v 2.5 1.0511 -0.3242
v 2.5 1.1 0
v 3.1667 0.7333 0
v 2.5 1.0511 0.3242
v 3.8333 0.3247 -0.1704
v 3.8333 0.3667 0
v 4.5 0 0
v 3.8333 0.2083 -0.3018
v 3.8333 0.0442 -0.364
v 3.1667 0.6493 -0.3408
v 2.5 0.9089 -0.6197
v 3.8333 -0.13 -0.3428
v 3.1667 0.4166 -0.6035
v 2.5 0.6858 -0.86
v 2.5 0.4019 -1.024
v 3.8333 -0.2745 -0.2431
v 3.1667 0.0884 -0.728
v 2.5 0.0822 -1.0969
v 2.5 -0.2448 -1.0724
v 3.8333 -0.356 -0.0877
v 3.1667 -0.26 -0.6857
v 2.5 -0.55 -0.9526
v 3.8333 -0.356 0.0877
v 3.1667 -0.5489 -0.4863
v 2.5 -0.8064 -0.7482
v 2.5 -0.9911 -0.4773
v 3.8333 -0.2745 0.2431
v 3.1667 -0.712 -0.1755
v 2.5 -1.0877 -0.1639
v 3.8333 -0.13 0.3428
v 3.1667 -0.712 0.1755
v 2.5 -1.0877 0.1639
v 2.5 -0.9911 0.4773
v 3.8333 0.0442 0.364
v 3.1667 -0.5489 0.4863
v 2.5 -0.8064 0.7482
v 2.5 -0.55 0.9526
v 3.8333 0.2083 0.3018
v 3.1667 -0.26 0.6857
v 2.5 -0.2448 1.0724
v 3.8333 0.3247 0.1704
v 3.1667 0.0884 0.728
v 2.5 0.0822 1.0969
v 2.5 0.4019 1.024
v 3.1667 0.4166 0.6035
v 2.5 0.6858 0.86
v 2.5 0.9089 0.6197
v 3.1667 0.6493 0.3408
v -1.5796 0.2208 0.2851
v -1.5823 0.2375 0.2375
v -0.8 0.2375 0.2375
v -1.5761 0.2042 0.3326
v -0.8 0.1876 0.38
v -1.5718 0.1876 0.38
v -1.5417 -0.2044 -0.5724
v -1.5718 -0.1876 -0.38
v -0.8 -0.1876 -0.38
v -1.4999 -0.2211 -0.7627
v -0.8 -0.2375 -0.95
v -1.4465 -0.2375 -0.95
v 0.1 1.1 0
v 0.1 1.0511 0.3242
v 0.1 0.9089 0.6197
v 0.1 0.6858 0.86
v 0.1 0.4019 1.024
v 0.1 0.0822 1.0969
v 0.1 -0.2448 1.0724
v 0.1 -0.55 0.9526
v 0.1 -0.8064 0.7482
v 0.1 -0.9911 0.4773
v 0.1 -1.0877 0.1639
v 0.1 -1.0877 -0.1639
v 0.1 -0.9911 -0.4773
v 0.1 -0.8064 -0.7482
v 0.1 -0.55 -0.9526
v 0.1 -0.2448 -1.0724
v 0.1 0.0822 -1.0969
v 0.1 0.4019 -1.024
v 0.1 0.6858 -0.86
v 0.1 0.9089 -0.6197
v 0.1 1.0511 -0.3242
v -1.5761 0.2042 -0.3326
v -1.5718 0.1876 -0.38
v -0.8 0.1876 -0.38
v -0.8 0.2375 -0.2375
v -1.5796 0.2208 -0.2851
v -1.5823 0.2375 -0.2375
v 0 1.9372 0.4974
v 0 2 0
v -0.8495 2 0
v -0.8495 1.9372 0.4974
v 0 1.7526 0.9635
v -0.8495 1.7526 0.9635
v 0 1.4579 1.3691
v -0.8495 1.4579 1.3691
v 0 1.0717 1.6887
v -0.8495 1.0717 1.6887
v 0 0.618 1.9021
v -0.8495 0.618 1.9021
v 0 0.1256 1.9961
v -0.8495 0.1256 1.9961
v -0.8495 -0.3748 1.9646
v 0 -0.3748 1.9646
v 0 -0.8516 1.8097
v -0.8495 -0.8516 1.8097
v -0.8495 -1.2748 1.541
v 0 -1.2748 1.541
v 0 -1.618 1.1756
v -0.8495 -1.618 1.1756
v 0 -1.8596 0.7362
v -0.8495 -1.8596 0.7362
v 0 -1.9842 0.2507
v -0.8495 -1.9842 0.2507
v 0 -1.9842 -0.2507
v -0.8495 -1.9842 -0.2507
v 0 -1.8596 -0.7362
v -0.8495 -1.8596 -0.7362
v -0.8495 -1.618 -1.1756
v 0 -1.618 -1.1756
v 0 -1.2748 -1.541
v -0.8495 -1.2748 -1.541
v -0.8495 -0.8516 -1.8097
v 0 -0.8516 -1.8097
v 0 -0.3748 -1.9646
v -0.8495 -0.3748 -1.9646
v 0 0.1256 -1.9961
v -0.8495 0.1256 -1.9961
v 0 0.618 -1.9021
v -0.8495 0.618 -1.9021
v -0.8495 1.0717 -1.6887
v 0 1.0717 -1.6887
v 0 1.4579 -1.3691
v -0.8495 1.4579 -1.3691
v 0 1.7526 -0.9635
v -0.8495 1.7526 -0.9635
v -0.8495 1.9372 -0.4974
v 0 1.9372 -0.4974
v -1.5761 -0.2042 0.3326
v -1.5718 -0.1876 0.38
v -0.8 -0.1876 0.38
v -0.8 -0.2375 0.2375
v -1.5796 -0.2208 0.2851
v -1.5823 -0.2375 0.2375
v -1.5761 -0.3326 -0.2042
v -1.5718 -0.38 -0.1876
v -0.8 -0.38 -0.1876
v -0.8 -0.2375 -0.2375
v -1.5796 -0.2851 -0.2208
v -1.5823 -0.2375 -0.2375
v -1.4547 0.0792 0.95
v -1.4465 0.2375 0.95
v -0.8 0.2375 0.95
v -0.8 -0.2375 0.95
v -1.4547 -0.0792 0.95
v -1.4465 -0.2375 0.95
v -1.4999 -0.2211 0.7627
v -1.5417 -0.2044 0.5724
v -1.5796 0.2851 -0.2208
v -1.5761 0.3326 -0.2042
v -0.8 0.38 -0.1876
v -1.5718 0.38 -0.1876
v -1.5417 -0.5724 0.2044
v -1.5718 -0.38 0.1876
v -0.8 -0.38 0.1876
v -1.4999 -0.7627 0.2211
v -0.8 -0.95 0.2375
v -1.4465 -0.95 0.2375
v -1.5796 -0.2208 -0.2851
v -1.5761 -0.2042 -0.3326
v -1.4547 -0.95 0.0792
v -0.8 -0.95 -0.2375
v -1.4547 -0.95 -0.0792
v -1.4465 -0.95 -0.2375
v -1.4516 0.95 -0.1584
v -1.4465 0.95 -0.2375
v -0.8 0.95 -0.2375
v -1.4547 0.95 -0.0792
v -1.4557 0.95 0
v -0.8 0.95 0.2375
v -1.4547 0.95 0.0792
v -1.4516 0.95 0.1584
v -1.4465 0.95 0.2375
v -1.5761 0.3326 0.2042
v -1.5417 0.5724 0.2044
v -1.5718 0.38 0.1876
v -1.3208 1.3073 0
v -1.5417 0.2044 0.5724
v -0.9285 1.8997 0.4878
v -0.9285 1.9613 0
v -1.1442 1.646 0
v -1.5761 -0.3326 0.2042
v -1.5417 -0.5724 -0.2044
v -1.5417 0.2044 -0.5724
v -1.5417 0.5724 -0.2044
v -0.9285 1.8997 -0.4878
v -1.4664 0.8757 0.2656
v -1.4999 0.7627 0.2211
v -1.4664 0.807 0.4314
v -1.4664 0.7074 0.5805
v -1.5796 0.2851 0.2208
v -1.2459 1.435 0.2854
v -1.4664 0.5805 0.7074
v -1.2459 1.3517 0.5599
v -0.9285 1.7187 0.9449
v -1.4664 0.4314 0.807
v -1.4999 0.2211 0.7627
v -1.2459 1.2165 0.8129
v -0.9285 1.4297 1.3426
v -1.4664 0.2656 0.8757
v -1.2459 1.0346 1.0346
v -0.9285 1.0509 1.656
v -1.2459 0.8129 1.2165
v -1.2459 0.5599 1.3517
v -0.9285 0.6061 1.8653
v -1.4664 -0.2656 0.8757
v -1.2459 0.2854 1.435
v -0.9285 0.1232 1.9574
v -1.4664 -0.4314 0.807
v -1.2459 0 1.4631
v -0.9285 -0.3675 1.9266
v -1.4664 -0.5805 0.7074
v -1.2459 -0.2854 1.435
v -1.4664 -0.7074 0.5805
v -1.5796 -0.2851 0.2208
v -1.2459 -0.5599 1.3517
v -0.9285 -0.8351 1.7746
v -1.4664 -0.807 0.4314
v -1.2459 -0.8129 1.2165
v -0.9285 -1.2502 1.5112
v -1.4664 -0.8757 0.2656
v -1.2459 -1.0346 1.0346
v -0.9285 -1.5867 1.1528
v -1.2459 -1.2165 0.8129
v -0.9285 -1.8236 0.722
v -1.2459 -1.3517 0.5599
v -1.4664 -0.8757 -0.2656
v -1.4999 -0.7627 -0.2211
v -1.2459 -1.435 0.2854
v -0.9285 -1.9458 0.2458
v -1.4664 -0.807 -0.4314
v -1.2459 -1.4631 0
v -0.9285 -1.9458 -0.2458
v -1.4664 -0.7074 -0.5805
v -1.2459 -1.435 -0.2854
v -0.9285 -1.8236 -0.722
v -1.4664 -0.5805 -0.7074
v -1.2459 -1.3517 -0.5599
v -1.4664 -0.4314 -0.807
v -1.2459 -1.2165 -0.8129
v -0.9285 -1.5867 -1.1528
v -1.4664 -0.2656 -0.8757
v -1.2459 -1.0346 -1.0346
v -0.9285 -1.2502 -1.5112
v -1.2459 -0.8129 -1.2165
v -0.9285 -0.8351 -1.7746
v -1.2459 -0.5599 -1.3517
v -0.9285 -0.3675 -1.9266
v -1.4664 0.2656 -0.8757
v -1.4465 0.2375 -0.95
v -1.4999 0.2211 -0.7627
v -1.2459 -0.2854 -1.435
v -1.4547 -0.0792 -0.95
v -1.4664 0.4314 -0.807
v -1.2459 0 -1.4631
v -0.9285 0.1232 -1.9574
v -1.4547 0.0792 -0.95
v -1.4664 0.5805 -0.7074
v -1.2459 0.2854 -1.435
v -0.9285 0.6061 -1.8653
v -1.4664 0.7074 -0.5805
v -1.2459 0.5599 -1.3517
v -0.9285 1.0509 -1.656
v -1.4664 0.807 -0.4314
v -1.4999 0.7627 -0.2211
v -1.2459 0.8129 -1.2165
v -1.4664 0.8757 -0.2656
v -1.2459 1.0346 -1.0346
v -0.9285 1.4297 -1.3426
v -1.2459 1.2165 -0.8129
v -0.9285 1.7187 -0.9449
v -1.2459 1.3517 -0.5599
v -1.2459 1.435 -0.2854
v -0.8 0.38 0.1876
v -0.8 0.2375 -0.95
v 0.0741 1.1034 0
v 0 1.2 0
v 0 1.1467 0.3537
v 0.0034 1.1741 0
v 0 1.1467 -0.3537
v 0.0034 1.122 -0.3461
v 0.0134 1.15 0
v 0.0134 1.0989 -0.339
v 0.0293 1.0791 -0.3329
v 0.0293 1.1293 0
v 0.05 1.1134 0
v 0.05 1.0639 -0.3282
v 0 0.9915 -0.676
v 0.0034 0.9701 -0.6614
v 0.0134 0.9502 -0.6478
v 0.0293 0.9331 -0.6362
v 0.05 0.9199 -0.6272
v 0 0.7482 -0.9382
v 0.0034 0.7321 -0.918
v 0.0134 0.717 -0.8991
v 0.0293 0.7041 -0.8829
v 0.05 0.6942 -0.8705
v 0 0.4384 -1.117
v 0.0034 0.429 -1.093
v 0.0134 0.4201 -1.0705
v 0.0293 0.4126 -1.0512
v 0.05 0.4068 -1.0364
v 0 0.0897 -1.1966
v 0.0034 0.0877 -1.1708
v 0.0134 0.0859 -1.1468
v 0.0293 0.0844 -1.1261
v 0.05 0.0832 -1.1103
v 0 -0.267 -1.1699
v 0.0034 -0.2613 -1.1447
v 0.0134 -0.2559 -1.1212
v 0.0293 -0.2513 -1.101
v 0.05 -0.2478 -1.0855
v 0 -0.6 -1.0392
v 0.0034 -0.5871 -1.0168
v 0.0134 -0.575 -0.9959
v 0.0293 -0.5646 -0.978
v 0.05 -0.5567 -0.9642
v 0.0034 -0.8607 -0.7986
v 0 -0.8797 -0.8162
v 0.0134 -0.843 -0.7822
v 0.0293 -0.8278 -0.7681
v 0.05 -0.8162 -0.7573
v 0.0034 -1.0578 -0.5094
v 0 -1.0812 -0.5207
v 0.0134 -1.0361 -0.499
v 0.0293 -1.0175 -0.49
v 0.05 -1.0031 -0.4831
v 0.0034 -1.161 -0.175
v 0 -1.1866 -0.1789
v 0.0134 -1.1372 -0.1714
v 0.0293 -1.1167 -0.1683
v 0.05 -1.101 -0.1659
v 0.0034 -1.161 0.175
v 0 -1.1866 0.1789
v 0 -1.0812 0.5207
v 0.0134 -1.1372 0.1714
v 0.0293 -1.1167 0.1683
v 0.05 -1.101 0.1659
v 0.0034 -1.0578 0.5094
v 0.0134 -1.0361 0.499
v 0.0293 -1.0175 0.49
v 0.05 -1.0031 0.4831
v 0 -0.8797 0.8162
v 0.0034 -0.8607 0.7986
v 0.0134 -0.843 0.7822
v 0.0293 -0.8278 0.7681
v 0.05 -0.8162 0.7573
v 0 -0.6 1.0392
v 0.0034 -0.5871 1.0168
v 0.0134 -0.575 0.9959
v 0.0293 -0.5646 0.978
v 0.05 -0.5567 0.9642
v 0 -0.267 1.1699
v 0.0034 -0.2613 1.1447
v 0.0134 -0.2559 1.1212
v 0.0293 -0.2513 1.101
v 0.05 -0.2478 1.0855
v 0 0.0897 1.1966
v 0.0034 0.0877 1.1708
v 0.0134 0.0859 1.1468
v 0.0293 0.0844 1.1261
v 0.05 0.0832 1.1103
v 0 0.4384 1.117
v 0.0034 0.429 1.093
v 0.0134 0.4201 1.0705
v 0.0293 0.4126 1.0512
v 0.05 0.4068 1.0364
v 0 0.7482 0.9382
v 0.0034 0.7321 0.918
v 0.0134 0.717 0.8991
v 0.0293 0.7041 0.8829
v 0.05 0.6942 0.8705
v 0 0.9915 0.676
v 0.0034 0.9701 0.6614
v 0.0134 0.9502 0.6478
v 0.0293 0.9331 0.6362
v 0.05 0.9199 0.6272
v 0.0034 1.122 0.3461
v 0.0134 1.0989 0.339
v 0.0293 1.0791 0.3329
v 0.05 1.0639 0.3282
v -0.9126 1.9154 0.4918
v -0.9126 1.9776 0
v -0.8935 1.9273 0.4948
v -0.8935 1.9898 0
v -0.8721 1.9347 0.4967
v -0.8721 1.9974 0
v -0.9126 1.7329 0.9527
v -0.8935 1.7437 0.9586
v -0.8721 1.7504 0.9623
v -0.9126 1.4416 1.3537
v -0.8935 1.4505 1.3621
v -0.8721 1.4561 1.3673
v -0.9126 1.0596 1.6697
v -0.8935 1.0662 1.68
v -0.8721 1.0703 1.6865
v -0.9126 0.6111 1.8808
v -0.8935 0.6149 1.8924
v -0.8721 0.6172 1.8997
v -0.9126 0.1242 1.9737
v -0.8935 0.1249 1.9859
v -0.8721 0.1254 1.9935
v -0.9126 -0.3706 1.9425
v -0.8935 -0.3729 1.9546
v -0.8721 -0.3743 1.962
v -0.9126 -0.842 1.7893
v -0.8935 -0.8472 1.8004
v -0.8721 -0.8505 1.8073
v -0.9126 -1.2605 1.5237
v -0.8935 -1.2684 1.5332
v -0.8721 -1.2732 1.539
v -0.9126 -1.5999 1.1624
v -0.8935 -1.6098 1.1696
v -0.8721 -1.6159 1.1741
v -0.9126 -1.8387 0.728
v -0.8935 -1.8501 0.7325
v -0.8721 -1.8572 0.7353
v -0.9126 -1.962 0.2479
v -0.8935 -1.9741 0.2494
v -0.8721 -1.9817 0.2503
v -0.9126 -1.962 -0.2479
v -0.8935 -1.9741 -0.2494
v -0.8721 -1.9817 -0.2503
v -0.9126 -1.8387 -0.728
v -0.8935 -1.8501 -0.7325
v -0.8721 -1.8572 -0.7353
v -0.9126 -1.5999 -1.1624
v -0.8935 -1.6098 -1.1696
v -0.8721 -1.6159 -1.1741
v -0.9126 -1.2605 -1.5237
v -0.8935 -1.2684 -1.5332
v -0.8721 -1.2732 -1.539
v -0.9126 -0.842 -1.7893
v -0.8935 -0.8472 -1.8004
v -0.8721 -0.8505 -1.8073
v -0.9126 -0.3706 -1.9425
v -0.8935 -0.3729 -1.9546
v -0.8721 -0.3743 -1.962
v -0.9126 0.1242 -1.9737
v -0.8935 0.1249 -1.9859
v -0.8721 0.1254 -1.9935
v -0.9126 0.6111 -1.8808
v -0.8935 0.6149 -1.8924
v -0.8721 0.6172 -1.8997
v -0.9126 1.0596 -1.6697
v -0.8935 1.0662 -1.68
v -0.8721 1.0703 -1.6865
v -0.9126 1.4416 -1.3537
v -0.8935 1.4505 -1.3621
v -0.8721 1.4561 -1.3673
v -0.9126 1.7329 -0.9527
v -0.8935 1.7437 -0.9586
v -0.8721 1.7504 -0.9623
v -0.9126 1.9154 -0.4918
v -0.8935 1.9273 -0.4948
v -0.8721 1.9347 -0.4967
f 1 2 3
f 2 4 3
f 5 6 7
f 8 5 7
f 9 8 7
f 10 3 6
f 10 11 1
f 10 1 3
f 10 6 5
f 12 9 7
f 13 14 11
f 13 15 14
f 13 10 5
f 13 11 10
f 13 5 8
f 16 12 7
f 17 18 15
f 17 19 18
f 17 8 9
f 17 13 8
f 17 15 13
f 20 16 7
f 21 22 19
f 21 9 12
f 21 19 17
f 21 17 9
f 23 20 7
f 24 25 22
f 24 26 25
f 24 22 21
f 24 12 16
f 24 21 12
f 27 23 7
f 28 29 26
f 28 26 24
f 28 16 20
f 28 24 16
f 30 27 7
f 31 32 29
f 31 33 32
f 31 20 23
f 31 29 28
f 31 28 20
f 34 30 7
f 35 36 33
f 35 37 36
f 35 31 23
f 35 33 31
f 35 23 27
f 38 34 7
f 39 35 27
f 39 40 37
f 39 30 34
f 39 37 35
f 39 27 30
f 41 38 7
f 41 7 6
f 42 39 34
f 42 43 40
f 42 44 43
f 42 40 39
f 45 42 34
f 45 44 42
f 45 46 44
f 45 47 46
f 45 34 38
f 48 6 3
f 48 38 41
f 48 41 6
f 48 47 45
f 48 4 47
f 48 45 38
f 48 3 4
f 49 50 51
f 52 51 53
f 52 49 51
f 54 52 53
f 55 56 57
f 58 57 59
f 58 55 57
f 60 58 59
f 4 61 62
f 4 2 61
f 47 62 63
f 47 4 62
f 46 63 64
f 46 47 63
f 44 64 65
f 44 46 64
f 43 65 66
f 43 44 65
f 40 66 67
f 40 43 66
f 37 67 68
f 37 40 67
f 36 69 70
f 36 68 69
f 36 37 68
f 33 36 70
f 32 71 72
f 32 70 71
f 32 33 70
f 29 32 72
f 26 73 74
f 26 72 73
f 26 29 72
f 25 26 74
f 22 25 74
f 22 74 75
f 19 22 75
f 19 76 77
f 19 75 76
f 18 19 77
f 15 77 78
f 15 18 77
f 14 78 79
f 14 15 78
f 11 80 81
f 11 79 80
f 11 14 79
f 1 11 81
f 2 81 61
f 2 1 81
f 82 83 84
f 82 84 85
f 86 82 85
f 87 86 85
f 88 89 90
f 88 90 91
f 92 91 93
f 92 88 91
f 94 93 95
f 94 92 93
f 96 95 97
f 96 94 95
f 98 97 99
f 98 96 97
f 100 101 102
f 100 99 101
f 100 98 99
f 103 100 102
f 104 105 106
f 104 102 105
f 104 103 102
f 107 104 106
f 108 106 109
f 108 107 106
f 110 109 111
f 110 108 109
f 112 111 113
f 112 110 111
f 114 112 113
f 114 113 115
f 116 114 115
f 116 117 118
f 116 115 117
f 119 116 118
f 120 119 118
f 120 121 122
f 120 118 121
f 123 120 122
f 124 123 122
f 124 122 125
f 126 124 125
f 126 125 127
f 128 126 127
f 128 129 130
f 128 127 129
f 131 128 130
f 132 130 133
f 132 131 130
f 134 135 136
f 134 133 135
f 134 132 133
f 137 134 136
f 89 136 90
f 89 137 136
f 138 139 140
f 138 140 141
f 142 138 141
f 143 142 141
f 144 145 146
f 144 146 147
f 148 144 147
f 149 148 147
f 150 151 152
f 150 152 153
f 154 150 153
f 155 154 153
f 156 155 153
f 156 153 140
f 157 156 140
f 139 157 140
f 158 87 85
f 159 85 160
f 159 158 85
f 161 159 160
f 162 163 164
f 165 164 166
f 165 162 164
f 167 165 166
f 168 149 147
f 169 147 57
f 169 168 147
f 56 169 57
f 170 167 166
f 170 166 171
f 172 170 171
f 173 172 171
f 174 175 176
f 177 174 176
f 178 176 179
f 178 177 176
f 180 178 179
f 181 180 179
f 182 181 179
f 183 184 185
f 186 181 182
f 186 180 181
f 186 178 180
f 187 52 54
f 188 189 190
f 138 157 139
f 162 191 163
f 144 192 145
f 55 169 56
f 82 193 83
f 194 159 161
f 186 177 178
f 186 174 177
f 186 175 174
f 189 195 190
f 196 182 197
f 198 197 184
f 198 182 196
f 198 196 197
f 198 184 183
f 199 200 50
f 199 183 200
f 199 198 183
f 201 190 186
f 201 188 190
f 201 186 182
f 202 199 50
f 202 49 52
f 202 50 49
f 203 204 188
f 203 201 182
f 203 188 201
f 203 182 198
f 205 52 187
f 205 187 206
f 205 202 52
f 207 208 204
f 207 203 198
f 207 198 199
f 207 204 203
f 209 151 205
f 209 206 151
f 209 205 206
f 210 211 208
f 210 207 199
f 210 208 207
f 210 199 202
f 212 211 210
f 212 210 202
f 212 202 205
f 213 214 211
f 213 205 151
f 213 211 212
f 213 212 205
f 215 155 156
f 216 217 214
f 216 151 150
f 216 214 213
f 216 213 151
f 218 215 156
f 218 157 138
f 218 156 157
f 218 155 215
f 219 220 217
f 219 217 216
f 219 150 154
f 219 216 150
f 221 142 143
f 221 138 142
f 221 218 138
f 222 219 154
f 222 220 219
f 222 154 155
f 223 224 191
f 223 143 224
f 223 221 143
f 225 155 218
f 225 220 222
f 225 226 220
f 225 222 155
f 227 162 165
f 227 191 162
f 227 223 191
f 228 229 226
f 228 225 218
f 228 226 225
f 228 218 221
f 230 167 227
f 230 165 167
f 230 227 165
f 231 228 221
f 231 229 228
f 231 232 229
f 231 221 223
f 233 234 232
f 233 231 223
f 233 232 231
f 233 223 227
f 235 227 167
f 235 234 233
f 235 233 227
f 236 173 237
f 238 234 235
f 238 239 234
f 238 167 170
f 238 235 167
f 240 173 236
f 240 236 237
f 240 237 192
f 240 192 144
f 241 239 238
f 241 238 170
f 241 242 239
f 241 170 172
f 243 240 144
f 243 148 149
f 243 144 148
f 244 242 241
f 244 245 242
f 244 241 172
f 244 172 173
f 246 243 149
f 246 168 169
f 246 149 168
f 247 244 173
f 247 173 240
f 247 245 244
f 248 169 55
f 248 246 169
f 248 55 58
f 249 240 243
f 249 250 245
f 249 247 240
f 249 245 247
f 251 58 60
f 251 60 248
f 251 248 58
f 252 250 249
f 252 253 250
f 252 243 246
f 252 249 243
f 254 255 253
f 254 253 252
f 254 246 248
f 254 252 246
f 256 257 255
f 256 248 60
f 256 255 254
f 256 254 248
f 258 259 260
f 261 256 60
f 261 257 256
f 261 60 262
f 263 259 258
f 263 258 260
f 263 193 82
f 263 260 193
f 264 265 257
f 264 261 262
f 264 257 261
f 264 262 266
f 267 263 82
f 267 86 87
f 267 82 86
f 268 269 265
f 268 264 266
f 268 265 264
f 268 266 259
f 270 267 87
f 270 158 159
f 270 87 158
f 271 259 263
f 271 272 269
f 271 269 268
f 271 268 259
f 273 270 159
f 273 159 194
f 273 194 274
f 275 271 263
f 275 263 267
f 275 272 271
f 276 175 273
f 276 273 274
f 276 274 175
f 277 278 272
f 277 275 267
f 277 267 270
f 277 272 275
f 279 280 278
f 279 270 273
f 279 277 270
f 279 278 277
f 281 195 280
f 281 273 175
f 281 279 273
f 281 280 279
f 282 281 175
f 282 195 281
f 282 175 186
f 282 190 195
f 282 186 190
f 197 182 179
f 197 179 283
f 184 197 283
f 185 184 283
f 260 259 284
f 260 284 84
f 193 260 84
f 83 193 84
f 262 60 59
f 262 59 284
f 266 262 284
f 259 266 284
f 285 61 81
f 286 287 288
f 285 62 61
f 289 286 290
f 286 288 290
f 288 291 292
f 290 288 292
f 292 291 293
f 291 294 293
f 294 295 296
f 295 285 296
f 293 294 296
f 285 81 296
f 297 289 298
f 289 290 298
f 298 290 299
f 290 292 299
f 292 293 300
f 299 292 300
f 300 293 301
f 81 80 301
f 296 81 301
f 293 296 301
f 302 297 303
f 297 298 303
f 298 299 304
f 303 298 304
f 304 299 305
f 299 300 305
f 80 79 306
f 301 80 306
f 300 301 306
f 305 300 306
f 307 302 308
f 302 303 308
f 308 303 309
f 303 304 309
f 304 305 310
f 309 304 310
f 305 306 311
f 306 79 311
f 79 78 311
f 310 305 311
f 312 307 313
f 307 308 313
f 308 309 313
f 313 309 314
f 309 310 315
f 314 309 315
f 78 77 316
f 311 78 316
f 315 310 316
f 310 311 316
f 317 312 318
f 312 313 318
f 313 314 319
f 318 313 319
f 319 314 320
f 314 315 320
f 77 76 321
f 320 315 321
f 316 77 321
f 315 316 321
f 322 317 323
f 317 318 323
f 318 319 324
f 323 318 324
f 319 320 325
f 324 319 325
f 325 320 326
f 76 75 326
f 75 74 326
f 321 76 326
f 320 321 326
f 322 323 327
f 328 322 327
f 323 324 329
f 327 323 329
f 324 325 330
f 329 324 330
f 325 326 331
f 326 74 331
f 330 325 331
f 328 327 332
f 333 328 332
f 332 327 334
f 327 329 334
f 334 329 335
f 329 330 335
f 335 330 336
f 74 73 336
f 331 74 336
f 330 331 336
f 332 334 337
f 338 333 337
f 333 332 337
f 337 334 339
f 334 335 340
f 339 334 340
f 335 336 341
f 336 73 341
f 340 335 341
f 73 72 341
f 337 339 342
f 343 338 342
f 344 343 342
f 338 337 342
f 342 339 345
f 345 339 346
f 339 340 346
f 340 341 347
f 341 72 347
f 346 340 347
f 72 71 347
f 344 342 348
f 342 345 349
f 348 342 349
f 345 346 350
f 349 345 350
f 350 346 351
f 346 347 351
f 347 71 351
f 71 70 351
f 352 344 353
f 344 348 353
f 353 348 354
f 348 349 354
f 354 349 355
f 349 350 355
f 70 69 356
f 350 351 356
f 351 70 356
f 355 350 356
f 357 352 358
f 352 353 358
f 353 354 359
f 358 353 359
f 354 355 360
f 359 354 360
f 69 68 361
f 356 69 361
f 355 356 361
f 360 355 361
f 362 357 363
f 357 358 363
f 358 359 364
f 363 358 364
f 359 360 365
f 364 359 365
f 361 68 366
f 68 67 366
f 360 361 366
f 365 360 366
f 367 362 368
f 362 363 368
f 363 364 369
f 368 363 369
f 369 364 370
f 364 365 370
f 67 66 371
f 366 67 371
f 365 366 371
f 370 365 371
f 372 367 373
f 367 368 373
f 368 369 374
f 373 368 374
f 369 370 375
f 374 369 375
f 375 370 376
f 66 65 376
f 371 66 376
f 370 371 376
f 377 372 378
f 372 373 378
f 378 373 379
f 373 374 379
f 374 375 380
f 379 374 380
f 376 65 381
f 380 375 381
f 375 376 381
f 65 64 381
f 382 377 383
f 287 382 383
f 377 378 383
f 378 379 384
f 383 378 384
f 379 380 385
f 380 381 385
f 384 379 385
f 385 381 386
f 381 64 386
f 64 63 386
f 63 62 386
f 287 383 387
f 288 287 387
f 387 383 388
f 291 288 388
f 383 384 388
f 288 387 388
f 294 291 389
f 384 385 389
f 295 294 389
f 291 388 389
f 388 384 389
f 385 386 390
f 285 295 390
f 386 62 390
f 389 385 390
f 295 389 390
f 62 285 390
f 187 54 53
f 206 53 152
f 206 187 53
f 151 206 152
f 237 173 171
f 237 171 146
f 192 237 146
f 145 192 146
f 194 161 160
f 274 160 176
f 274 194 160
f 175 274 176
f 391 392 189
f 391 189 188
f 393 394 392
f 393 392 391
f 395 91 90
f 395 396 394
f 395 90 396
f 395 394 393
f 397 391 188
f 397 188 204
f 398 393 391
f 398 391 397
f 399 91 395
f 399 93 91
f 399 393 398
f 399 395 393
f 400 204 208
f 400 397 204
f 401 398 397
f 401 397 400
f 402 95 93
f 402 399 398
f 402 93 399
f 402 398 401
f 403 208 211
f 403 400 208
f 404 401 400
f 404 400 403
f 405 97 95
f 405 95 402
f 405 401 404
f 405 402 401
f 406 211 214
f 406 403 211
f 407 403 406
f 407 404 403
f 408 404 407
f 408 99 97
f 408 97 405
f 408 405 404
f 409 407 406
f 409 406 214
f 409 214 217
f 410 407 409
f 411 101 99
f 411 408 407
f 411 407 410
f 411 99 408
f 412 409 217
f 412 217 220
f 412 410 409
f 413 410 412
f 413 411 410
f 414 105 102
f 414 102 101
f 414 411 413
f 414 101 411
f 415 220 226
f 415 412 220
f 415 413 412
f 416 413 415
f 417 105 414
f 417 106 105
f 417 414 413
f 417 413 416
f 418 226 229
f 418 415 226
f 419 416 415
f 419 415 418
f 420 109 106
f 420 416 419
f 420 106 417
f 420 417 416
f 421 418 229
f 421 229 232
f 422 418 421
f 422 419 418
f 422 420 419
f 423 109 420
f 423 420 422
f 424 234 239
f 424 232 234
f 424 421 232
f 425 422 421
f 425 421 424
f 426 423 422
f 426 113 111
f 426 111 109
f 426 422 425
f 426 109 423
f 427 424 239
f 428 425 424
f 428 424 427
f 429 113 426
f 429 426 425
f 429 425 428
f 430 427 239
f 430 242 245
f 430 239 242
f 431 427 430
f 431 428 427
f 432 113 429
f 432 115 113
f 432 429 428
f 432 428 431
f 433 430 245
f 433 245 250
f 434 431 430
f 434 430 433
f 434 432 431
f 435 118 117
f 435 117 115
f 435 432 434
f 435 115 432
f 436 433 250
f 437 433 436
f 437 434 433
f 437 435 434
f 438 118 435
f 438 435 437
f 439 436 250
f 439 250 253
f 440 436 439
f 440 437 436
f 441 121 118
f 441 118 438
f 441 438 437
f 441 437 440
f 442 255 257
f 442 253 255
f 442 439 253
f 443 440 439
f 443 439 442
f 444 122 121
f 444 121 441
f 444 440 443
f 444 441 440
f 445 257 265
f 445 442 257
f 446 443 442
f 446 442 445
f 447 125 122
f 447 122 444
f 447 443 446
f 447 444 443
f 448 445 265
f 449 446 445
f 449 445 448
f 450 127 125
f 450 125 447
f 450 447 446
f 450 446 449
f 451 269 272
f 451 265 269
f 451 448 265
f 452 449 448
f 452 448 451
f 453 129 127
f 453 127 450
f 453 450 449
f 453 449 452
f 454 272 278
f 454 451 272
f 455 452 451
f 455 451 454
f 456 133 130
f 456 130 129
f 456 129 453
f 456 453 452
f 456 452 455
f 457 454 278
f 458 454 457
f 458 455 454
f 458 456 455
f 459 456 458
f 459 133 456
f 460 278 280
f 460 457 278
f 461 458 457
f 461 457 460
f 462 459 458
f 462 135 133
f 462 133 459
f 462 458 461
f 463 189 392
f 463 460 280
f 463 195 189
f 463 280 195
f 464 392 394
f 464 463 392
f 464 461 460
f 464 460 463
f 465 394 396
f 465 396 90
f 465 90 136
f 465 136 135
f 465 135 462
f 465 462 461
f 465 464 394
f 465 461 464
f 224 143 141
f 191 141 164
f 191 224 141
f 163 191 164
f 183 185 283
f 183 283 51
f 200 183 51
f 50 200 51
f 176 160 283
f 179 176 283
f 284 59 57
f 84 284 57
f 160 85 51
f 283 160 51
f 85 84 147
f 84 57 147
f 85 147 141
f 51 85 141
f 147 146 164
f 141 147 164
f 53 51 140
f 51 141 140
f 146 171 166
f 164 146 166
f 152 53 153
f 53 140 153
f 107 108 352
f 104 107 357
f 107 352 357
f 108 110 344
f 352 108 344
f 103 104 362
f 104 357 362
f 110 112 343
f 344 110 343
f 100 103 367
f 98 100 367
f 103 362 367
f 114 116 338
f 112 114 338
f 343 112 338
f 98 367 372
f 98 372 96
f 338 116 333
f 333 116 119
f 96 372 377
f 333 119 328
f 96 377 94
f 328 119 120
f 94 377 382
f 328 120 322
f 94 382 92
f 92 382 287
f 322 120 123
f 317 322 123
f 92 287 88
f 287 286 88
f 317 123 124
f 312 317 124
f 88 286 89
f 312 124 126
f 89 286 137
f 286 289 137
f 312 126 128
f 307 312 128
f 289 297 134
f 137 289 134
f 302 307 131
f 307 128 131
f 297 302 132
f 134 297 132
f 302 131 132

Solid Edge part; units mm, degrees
sketch "Sketch1" plane through (0, 0, 0) normal (0, 0, 1) x (1, 0, 0)
  arc A0 (-1.6, 0) -> (-0.9285, 1.9613) centre (1.6, 0) cw
  arc A1 (-0.9285, 1.9613) -> (-0.8495, 2) centre (-0.8495, 1.9) cw
  line L0 (-0.8495, 2) -> (0, 2)
  line L1 (0, 2) -> (0, 1.2)
  arc A2 (0, 1.2) -> (0.1, 1.1) centre (0.1, 1.2) ccw
  line L2 (0.1, 1.1) -> (2.5, 1.1)
  line L3 (2.5, 1.1) -> (4.5, 0)
  line L4 (4.5, 0) -> (-1.6, 0)
revolve "RevolvedProtrusion1" add sketch "Sketch1" angle 360 about axis through (4.5, 0, 0) along (-1, 0, 0)
cosmetic_thread "Thread1" size "M2.2"
sketch "Sketch2" plane through (-1.6, 0, 0) normal (1, 0, 0) x (0, 1, 0)
  line L0 (0.2375, 0.95) -> (-0.2375, 0.95)
  line L1 (-0.2375, 0.95) -> (-0.1876, 0.38)
  line L2 (-0.1876, 0.38) -> (-0.2375, 0.2375)
  line L3 (-0.2375, 0.2375) -> (-0.38, 0.1876)
  line L4 (-0.38, 0.1876) -> (-0.95, 0.2375)
  line L5 (-0.95, 0.2375) -> (-0.95, -0.2375)
  line L6 (-0.95, -0.2375) -> (-0.38, -0.1876)
  line L7 (-0.38, -0.1876) -> (-0.2375, -0.2375)
  line L8 (-0.2375, -0.2375) -> (-0.1876, -0.38)
  line L9 (-0.1876, -0.38) -> (-0.2375, -0.95)
  line L10 (-0.2375, -0.95) -> (0.2375, -0.95)
  line L11 (0.2375, -0.95) -> (0.1876, -0.38)
  line L12 (0.1876, -0.38) -> (0.2375, -0.2375)
  line L13 (0.2375, -0.2375) -> (0.38, -0.1876)
  line L14 (0.38, -0.1876) -> (0.95, -0.2375)
  line L15 (0.95, -0.2375) -> (0.95, 0.2375)
  line L16 (0.95, 0.2375) -> (0.38, 0.1876)
  line L17 (0.38, 0.1876) -> (0.2375, 0.2375)
  line L18 (0.2375, 0.2375) -> (0.1876, 0.38)
  line L19 (0.1876, 0.38) -> (0.2375, 0.95)
extrude "ExtrudedCutout_1" cut sketch "Sketch2" along normal blind 0.8
properties part number "SFS FN 362 310412 Blechschraube ISO 7049 Stahl einsatzgehärtet   verzinkt blau ST2.2x4.5-C-H"
